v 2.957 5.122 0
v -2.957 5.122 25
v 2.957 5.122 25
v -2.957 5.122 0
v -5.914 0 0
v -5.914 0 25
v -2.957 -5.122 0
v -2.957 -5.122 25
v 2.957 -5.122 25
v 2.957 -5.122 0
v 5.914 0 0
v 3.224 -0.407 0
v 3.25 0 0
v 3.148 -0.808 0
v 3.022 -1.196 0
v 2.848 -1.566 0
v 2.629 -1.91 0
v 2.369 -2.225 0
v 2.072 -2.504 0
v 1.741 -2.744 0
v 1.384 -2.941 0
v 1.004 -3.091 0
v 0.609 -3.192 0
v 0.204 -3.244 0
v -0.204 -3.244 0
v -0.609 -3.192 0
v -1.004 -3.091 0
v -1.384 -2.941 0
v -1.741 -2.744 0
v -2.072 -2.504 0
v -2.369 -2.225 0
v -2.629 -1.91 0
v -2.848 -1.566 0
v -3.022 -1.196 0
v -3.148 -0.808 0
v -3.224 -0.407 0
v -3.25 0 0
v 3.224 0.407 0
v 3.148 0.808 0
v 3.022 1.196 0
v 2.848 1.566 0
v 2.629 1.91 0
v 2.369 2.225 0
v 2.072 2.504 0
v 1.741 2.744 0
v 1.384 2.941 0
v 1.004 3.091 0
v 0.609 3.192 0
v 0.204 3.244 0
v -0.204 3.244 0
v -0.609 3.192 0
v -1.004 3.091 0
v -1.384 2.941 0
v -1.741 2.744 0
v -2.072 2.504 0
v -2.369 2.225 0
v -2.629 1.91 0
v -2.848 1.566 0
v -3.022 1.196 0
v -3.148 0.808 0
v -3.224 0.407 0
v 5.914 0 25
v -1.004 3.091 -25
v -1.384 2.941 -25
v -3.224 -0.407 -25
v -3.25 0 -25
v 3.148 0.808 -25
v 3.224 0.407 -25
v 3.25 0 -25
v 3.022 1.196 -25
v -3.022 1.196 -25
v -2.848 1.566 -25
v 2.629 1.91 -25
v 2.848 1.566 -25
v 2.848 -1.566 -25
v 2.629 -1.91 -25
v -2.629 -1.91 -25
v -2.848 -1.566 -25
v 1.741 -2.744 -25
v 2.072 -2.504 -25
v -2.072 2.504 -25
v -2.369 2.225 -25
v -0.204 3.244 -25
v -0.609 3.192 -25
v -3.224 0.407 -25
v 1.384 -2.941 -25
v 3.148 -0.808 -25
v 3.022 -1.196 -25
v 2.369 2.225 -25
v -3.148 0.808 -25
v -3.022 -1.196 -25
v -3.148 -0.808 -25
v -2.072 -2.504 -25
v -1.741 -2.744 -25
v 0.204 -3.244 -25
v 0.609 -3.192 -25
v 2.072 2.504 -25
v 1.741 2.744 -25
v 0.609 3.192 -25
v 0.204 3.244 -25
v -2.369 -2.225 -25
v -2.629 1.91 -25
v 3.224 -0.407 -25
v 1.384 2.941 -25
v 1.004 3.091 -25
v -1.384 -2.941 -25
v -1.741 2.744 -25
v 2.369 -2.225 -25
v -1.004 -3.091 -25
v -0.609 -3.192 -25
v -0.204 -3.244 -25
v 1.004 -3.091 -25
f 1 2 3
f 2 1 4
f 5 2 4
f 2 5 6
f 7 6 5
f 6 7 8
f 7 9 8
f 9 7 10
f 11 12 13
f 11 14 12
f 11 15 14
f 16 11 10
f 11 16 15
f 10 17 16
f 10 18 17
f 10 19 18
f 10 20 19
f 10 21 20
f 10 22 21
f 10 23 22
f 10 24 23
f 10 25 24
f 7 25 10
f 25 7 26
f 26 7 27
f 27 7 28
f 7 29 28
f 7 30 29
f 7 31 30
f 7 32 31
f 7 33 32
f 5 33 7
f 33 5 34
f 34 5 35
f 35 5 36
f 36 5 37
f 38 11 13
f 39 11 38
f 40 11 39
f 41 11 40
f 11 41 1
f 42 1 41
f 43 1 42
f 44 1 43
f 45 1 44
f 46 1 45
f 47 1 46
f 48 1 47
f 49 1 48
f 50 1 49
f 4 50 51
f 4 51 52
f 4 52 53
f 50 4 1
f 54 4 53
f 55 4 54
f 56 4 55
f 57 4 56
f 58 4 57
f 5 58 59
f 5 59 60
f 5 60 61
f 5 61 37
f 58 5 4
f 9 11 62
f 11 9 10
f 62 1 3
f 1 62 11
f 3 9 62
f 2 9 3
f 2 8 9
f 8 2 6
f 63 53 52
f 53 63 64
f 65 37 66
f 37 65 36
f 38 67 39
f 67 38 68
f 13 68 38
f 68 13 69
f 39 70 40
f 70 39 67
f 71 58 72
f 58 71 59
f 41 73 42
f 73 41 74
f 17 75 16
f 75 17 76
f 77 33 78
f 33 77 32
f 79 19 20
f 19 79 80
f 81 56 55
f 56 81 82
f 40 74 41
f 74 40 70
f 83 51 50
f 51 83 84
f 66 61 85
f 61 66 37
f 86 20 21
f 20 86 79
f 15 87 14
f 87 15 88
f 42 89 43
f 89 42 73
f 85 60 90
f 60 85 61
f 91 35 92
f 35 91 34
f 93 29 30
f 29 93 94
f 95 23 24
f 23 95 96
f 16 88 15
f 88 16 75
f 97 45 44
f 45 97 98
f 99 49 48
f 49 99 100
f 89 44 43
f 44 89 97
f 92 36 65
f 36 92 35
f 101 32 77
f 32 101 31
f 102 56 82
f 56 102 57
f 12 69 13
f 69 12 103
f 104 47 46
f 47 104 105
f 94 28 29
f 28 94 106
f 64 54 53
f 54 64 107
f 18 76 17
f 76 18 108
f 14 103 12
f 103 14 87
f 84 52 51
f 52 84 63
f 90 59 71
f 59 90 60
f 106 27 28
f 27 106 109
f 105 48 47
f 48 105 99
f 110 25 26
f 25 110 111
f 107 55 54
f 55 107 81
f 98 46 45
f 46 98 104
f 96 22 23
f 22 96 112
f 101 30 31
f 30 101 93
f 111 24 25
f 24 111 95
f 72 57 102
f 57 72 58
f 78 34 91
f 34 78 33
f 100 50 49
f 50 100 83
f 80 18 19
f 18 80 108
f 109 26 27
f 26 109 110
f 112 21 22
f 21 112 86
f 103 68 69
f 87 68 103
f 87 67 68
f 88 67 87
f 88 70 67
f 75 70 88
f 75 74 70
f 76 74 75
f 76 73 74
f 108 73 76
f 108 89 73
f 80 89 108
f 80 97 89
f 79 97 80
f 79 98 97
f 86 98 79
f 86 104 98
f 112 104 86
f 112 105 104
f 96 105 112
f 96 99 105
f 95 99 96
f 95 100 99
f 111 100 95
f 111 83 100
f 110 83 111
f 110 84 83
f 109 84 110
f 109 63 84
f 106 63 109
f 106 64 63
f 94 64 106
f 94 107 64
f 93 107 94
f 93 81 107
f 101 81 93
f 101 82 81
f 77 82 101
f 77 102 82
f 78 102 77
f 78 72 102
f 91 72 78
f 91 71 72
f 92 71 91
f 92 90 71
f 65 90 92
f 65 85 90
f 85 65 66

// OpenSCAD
$fn = 50;


difference() {
	union() {
		linear_extrude(height = 25) {
			polygon(points = [[5.9142500000, 0.0000000000], [2.9571250000, 5.1218907443], [-2.9571250000, 5.1218907443], [-5.9142500000, 0.0000000000], [-2.9571250000, -5.1218907443], [2.9571250000, -5.1218907443]]);
		}
		translate(v = [0, 0, -25]) {
			cylinder(h = 25, r = 3.2500000000);
		}
	}
	union();
}
